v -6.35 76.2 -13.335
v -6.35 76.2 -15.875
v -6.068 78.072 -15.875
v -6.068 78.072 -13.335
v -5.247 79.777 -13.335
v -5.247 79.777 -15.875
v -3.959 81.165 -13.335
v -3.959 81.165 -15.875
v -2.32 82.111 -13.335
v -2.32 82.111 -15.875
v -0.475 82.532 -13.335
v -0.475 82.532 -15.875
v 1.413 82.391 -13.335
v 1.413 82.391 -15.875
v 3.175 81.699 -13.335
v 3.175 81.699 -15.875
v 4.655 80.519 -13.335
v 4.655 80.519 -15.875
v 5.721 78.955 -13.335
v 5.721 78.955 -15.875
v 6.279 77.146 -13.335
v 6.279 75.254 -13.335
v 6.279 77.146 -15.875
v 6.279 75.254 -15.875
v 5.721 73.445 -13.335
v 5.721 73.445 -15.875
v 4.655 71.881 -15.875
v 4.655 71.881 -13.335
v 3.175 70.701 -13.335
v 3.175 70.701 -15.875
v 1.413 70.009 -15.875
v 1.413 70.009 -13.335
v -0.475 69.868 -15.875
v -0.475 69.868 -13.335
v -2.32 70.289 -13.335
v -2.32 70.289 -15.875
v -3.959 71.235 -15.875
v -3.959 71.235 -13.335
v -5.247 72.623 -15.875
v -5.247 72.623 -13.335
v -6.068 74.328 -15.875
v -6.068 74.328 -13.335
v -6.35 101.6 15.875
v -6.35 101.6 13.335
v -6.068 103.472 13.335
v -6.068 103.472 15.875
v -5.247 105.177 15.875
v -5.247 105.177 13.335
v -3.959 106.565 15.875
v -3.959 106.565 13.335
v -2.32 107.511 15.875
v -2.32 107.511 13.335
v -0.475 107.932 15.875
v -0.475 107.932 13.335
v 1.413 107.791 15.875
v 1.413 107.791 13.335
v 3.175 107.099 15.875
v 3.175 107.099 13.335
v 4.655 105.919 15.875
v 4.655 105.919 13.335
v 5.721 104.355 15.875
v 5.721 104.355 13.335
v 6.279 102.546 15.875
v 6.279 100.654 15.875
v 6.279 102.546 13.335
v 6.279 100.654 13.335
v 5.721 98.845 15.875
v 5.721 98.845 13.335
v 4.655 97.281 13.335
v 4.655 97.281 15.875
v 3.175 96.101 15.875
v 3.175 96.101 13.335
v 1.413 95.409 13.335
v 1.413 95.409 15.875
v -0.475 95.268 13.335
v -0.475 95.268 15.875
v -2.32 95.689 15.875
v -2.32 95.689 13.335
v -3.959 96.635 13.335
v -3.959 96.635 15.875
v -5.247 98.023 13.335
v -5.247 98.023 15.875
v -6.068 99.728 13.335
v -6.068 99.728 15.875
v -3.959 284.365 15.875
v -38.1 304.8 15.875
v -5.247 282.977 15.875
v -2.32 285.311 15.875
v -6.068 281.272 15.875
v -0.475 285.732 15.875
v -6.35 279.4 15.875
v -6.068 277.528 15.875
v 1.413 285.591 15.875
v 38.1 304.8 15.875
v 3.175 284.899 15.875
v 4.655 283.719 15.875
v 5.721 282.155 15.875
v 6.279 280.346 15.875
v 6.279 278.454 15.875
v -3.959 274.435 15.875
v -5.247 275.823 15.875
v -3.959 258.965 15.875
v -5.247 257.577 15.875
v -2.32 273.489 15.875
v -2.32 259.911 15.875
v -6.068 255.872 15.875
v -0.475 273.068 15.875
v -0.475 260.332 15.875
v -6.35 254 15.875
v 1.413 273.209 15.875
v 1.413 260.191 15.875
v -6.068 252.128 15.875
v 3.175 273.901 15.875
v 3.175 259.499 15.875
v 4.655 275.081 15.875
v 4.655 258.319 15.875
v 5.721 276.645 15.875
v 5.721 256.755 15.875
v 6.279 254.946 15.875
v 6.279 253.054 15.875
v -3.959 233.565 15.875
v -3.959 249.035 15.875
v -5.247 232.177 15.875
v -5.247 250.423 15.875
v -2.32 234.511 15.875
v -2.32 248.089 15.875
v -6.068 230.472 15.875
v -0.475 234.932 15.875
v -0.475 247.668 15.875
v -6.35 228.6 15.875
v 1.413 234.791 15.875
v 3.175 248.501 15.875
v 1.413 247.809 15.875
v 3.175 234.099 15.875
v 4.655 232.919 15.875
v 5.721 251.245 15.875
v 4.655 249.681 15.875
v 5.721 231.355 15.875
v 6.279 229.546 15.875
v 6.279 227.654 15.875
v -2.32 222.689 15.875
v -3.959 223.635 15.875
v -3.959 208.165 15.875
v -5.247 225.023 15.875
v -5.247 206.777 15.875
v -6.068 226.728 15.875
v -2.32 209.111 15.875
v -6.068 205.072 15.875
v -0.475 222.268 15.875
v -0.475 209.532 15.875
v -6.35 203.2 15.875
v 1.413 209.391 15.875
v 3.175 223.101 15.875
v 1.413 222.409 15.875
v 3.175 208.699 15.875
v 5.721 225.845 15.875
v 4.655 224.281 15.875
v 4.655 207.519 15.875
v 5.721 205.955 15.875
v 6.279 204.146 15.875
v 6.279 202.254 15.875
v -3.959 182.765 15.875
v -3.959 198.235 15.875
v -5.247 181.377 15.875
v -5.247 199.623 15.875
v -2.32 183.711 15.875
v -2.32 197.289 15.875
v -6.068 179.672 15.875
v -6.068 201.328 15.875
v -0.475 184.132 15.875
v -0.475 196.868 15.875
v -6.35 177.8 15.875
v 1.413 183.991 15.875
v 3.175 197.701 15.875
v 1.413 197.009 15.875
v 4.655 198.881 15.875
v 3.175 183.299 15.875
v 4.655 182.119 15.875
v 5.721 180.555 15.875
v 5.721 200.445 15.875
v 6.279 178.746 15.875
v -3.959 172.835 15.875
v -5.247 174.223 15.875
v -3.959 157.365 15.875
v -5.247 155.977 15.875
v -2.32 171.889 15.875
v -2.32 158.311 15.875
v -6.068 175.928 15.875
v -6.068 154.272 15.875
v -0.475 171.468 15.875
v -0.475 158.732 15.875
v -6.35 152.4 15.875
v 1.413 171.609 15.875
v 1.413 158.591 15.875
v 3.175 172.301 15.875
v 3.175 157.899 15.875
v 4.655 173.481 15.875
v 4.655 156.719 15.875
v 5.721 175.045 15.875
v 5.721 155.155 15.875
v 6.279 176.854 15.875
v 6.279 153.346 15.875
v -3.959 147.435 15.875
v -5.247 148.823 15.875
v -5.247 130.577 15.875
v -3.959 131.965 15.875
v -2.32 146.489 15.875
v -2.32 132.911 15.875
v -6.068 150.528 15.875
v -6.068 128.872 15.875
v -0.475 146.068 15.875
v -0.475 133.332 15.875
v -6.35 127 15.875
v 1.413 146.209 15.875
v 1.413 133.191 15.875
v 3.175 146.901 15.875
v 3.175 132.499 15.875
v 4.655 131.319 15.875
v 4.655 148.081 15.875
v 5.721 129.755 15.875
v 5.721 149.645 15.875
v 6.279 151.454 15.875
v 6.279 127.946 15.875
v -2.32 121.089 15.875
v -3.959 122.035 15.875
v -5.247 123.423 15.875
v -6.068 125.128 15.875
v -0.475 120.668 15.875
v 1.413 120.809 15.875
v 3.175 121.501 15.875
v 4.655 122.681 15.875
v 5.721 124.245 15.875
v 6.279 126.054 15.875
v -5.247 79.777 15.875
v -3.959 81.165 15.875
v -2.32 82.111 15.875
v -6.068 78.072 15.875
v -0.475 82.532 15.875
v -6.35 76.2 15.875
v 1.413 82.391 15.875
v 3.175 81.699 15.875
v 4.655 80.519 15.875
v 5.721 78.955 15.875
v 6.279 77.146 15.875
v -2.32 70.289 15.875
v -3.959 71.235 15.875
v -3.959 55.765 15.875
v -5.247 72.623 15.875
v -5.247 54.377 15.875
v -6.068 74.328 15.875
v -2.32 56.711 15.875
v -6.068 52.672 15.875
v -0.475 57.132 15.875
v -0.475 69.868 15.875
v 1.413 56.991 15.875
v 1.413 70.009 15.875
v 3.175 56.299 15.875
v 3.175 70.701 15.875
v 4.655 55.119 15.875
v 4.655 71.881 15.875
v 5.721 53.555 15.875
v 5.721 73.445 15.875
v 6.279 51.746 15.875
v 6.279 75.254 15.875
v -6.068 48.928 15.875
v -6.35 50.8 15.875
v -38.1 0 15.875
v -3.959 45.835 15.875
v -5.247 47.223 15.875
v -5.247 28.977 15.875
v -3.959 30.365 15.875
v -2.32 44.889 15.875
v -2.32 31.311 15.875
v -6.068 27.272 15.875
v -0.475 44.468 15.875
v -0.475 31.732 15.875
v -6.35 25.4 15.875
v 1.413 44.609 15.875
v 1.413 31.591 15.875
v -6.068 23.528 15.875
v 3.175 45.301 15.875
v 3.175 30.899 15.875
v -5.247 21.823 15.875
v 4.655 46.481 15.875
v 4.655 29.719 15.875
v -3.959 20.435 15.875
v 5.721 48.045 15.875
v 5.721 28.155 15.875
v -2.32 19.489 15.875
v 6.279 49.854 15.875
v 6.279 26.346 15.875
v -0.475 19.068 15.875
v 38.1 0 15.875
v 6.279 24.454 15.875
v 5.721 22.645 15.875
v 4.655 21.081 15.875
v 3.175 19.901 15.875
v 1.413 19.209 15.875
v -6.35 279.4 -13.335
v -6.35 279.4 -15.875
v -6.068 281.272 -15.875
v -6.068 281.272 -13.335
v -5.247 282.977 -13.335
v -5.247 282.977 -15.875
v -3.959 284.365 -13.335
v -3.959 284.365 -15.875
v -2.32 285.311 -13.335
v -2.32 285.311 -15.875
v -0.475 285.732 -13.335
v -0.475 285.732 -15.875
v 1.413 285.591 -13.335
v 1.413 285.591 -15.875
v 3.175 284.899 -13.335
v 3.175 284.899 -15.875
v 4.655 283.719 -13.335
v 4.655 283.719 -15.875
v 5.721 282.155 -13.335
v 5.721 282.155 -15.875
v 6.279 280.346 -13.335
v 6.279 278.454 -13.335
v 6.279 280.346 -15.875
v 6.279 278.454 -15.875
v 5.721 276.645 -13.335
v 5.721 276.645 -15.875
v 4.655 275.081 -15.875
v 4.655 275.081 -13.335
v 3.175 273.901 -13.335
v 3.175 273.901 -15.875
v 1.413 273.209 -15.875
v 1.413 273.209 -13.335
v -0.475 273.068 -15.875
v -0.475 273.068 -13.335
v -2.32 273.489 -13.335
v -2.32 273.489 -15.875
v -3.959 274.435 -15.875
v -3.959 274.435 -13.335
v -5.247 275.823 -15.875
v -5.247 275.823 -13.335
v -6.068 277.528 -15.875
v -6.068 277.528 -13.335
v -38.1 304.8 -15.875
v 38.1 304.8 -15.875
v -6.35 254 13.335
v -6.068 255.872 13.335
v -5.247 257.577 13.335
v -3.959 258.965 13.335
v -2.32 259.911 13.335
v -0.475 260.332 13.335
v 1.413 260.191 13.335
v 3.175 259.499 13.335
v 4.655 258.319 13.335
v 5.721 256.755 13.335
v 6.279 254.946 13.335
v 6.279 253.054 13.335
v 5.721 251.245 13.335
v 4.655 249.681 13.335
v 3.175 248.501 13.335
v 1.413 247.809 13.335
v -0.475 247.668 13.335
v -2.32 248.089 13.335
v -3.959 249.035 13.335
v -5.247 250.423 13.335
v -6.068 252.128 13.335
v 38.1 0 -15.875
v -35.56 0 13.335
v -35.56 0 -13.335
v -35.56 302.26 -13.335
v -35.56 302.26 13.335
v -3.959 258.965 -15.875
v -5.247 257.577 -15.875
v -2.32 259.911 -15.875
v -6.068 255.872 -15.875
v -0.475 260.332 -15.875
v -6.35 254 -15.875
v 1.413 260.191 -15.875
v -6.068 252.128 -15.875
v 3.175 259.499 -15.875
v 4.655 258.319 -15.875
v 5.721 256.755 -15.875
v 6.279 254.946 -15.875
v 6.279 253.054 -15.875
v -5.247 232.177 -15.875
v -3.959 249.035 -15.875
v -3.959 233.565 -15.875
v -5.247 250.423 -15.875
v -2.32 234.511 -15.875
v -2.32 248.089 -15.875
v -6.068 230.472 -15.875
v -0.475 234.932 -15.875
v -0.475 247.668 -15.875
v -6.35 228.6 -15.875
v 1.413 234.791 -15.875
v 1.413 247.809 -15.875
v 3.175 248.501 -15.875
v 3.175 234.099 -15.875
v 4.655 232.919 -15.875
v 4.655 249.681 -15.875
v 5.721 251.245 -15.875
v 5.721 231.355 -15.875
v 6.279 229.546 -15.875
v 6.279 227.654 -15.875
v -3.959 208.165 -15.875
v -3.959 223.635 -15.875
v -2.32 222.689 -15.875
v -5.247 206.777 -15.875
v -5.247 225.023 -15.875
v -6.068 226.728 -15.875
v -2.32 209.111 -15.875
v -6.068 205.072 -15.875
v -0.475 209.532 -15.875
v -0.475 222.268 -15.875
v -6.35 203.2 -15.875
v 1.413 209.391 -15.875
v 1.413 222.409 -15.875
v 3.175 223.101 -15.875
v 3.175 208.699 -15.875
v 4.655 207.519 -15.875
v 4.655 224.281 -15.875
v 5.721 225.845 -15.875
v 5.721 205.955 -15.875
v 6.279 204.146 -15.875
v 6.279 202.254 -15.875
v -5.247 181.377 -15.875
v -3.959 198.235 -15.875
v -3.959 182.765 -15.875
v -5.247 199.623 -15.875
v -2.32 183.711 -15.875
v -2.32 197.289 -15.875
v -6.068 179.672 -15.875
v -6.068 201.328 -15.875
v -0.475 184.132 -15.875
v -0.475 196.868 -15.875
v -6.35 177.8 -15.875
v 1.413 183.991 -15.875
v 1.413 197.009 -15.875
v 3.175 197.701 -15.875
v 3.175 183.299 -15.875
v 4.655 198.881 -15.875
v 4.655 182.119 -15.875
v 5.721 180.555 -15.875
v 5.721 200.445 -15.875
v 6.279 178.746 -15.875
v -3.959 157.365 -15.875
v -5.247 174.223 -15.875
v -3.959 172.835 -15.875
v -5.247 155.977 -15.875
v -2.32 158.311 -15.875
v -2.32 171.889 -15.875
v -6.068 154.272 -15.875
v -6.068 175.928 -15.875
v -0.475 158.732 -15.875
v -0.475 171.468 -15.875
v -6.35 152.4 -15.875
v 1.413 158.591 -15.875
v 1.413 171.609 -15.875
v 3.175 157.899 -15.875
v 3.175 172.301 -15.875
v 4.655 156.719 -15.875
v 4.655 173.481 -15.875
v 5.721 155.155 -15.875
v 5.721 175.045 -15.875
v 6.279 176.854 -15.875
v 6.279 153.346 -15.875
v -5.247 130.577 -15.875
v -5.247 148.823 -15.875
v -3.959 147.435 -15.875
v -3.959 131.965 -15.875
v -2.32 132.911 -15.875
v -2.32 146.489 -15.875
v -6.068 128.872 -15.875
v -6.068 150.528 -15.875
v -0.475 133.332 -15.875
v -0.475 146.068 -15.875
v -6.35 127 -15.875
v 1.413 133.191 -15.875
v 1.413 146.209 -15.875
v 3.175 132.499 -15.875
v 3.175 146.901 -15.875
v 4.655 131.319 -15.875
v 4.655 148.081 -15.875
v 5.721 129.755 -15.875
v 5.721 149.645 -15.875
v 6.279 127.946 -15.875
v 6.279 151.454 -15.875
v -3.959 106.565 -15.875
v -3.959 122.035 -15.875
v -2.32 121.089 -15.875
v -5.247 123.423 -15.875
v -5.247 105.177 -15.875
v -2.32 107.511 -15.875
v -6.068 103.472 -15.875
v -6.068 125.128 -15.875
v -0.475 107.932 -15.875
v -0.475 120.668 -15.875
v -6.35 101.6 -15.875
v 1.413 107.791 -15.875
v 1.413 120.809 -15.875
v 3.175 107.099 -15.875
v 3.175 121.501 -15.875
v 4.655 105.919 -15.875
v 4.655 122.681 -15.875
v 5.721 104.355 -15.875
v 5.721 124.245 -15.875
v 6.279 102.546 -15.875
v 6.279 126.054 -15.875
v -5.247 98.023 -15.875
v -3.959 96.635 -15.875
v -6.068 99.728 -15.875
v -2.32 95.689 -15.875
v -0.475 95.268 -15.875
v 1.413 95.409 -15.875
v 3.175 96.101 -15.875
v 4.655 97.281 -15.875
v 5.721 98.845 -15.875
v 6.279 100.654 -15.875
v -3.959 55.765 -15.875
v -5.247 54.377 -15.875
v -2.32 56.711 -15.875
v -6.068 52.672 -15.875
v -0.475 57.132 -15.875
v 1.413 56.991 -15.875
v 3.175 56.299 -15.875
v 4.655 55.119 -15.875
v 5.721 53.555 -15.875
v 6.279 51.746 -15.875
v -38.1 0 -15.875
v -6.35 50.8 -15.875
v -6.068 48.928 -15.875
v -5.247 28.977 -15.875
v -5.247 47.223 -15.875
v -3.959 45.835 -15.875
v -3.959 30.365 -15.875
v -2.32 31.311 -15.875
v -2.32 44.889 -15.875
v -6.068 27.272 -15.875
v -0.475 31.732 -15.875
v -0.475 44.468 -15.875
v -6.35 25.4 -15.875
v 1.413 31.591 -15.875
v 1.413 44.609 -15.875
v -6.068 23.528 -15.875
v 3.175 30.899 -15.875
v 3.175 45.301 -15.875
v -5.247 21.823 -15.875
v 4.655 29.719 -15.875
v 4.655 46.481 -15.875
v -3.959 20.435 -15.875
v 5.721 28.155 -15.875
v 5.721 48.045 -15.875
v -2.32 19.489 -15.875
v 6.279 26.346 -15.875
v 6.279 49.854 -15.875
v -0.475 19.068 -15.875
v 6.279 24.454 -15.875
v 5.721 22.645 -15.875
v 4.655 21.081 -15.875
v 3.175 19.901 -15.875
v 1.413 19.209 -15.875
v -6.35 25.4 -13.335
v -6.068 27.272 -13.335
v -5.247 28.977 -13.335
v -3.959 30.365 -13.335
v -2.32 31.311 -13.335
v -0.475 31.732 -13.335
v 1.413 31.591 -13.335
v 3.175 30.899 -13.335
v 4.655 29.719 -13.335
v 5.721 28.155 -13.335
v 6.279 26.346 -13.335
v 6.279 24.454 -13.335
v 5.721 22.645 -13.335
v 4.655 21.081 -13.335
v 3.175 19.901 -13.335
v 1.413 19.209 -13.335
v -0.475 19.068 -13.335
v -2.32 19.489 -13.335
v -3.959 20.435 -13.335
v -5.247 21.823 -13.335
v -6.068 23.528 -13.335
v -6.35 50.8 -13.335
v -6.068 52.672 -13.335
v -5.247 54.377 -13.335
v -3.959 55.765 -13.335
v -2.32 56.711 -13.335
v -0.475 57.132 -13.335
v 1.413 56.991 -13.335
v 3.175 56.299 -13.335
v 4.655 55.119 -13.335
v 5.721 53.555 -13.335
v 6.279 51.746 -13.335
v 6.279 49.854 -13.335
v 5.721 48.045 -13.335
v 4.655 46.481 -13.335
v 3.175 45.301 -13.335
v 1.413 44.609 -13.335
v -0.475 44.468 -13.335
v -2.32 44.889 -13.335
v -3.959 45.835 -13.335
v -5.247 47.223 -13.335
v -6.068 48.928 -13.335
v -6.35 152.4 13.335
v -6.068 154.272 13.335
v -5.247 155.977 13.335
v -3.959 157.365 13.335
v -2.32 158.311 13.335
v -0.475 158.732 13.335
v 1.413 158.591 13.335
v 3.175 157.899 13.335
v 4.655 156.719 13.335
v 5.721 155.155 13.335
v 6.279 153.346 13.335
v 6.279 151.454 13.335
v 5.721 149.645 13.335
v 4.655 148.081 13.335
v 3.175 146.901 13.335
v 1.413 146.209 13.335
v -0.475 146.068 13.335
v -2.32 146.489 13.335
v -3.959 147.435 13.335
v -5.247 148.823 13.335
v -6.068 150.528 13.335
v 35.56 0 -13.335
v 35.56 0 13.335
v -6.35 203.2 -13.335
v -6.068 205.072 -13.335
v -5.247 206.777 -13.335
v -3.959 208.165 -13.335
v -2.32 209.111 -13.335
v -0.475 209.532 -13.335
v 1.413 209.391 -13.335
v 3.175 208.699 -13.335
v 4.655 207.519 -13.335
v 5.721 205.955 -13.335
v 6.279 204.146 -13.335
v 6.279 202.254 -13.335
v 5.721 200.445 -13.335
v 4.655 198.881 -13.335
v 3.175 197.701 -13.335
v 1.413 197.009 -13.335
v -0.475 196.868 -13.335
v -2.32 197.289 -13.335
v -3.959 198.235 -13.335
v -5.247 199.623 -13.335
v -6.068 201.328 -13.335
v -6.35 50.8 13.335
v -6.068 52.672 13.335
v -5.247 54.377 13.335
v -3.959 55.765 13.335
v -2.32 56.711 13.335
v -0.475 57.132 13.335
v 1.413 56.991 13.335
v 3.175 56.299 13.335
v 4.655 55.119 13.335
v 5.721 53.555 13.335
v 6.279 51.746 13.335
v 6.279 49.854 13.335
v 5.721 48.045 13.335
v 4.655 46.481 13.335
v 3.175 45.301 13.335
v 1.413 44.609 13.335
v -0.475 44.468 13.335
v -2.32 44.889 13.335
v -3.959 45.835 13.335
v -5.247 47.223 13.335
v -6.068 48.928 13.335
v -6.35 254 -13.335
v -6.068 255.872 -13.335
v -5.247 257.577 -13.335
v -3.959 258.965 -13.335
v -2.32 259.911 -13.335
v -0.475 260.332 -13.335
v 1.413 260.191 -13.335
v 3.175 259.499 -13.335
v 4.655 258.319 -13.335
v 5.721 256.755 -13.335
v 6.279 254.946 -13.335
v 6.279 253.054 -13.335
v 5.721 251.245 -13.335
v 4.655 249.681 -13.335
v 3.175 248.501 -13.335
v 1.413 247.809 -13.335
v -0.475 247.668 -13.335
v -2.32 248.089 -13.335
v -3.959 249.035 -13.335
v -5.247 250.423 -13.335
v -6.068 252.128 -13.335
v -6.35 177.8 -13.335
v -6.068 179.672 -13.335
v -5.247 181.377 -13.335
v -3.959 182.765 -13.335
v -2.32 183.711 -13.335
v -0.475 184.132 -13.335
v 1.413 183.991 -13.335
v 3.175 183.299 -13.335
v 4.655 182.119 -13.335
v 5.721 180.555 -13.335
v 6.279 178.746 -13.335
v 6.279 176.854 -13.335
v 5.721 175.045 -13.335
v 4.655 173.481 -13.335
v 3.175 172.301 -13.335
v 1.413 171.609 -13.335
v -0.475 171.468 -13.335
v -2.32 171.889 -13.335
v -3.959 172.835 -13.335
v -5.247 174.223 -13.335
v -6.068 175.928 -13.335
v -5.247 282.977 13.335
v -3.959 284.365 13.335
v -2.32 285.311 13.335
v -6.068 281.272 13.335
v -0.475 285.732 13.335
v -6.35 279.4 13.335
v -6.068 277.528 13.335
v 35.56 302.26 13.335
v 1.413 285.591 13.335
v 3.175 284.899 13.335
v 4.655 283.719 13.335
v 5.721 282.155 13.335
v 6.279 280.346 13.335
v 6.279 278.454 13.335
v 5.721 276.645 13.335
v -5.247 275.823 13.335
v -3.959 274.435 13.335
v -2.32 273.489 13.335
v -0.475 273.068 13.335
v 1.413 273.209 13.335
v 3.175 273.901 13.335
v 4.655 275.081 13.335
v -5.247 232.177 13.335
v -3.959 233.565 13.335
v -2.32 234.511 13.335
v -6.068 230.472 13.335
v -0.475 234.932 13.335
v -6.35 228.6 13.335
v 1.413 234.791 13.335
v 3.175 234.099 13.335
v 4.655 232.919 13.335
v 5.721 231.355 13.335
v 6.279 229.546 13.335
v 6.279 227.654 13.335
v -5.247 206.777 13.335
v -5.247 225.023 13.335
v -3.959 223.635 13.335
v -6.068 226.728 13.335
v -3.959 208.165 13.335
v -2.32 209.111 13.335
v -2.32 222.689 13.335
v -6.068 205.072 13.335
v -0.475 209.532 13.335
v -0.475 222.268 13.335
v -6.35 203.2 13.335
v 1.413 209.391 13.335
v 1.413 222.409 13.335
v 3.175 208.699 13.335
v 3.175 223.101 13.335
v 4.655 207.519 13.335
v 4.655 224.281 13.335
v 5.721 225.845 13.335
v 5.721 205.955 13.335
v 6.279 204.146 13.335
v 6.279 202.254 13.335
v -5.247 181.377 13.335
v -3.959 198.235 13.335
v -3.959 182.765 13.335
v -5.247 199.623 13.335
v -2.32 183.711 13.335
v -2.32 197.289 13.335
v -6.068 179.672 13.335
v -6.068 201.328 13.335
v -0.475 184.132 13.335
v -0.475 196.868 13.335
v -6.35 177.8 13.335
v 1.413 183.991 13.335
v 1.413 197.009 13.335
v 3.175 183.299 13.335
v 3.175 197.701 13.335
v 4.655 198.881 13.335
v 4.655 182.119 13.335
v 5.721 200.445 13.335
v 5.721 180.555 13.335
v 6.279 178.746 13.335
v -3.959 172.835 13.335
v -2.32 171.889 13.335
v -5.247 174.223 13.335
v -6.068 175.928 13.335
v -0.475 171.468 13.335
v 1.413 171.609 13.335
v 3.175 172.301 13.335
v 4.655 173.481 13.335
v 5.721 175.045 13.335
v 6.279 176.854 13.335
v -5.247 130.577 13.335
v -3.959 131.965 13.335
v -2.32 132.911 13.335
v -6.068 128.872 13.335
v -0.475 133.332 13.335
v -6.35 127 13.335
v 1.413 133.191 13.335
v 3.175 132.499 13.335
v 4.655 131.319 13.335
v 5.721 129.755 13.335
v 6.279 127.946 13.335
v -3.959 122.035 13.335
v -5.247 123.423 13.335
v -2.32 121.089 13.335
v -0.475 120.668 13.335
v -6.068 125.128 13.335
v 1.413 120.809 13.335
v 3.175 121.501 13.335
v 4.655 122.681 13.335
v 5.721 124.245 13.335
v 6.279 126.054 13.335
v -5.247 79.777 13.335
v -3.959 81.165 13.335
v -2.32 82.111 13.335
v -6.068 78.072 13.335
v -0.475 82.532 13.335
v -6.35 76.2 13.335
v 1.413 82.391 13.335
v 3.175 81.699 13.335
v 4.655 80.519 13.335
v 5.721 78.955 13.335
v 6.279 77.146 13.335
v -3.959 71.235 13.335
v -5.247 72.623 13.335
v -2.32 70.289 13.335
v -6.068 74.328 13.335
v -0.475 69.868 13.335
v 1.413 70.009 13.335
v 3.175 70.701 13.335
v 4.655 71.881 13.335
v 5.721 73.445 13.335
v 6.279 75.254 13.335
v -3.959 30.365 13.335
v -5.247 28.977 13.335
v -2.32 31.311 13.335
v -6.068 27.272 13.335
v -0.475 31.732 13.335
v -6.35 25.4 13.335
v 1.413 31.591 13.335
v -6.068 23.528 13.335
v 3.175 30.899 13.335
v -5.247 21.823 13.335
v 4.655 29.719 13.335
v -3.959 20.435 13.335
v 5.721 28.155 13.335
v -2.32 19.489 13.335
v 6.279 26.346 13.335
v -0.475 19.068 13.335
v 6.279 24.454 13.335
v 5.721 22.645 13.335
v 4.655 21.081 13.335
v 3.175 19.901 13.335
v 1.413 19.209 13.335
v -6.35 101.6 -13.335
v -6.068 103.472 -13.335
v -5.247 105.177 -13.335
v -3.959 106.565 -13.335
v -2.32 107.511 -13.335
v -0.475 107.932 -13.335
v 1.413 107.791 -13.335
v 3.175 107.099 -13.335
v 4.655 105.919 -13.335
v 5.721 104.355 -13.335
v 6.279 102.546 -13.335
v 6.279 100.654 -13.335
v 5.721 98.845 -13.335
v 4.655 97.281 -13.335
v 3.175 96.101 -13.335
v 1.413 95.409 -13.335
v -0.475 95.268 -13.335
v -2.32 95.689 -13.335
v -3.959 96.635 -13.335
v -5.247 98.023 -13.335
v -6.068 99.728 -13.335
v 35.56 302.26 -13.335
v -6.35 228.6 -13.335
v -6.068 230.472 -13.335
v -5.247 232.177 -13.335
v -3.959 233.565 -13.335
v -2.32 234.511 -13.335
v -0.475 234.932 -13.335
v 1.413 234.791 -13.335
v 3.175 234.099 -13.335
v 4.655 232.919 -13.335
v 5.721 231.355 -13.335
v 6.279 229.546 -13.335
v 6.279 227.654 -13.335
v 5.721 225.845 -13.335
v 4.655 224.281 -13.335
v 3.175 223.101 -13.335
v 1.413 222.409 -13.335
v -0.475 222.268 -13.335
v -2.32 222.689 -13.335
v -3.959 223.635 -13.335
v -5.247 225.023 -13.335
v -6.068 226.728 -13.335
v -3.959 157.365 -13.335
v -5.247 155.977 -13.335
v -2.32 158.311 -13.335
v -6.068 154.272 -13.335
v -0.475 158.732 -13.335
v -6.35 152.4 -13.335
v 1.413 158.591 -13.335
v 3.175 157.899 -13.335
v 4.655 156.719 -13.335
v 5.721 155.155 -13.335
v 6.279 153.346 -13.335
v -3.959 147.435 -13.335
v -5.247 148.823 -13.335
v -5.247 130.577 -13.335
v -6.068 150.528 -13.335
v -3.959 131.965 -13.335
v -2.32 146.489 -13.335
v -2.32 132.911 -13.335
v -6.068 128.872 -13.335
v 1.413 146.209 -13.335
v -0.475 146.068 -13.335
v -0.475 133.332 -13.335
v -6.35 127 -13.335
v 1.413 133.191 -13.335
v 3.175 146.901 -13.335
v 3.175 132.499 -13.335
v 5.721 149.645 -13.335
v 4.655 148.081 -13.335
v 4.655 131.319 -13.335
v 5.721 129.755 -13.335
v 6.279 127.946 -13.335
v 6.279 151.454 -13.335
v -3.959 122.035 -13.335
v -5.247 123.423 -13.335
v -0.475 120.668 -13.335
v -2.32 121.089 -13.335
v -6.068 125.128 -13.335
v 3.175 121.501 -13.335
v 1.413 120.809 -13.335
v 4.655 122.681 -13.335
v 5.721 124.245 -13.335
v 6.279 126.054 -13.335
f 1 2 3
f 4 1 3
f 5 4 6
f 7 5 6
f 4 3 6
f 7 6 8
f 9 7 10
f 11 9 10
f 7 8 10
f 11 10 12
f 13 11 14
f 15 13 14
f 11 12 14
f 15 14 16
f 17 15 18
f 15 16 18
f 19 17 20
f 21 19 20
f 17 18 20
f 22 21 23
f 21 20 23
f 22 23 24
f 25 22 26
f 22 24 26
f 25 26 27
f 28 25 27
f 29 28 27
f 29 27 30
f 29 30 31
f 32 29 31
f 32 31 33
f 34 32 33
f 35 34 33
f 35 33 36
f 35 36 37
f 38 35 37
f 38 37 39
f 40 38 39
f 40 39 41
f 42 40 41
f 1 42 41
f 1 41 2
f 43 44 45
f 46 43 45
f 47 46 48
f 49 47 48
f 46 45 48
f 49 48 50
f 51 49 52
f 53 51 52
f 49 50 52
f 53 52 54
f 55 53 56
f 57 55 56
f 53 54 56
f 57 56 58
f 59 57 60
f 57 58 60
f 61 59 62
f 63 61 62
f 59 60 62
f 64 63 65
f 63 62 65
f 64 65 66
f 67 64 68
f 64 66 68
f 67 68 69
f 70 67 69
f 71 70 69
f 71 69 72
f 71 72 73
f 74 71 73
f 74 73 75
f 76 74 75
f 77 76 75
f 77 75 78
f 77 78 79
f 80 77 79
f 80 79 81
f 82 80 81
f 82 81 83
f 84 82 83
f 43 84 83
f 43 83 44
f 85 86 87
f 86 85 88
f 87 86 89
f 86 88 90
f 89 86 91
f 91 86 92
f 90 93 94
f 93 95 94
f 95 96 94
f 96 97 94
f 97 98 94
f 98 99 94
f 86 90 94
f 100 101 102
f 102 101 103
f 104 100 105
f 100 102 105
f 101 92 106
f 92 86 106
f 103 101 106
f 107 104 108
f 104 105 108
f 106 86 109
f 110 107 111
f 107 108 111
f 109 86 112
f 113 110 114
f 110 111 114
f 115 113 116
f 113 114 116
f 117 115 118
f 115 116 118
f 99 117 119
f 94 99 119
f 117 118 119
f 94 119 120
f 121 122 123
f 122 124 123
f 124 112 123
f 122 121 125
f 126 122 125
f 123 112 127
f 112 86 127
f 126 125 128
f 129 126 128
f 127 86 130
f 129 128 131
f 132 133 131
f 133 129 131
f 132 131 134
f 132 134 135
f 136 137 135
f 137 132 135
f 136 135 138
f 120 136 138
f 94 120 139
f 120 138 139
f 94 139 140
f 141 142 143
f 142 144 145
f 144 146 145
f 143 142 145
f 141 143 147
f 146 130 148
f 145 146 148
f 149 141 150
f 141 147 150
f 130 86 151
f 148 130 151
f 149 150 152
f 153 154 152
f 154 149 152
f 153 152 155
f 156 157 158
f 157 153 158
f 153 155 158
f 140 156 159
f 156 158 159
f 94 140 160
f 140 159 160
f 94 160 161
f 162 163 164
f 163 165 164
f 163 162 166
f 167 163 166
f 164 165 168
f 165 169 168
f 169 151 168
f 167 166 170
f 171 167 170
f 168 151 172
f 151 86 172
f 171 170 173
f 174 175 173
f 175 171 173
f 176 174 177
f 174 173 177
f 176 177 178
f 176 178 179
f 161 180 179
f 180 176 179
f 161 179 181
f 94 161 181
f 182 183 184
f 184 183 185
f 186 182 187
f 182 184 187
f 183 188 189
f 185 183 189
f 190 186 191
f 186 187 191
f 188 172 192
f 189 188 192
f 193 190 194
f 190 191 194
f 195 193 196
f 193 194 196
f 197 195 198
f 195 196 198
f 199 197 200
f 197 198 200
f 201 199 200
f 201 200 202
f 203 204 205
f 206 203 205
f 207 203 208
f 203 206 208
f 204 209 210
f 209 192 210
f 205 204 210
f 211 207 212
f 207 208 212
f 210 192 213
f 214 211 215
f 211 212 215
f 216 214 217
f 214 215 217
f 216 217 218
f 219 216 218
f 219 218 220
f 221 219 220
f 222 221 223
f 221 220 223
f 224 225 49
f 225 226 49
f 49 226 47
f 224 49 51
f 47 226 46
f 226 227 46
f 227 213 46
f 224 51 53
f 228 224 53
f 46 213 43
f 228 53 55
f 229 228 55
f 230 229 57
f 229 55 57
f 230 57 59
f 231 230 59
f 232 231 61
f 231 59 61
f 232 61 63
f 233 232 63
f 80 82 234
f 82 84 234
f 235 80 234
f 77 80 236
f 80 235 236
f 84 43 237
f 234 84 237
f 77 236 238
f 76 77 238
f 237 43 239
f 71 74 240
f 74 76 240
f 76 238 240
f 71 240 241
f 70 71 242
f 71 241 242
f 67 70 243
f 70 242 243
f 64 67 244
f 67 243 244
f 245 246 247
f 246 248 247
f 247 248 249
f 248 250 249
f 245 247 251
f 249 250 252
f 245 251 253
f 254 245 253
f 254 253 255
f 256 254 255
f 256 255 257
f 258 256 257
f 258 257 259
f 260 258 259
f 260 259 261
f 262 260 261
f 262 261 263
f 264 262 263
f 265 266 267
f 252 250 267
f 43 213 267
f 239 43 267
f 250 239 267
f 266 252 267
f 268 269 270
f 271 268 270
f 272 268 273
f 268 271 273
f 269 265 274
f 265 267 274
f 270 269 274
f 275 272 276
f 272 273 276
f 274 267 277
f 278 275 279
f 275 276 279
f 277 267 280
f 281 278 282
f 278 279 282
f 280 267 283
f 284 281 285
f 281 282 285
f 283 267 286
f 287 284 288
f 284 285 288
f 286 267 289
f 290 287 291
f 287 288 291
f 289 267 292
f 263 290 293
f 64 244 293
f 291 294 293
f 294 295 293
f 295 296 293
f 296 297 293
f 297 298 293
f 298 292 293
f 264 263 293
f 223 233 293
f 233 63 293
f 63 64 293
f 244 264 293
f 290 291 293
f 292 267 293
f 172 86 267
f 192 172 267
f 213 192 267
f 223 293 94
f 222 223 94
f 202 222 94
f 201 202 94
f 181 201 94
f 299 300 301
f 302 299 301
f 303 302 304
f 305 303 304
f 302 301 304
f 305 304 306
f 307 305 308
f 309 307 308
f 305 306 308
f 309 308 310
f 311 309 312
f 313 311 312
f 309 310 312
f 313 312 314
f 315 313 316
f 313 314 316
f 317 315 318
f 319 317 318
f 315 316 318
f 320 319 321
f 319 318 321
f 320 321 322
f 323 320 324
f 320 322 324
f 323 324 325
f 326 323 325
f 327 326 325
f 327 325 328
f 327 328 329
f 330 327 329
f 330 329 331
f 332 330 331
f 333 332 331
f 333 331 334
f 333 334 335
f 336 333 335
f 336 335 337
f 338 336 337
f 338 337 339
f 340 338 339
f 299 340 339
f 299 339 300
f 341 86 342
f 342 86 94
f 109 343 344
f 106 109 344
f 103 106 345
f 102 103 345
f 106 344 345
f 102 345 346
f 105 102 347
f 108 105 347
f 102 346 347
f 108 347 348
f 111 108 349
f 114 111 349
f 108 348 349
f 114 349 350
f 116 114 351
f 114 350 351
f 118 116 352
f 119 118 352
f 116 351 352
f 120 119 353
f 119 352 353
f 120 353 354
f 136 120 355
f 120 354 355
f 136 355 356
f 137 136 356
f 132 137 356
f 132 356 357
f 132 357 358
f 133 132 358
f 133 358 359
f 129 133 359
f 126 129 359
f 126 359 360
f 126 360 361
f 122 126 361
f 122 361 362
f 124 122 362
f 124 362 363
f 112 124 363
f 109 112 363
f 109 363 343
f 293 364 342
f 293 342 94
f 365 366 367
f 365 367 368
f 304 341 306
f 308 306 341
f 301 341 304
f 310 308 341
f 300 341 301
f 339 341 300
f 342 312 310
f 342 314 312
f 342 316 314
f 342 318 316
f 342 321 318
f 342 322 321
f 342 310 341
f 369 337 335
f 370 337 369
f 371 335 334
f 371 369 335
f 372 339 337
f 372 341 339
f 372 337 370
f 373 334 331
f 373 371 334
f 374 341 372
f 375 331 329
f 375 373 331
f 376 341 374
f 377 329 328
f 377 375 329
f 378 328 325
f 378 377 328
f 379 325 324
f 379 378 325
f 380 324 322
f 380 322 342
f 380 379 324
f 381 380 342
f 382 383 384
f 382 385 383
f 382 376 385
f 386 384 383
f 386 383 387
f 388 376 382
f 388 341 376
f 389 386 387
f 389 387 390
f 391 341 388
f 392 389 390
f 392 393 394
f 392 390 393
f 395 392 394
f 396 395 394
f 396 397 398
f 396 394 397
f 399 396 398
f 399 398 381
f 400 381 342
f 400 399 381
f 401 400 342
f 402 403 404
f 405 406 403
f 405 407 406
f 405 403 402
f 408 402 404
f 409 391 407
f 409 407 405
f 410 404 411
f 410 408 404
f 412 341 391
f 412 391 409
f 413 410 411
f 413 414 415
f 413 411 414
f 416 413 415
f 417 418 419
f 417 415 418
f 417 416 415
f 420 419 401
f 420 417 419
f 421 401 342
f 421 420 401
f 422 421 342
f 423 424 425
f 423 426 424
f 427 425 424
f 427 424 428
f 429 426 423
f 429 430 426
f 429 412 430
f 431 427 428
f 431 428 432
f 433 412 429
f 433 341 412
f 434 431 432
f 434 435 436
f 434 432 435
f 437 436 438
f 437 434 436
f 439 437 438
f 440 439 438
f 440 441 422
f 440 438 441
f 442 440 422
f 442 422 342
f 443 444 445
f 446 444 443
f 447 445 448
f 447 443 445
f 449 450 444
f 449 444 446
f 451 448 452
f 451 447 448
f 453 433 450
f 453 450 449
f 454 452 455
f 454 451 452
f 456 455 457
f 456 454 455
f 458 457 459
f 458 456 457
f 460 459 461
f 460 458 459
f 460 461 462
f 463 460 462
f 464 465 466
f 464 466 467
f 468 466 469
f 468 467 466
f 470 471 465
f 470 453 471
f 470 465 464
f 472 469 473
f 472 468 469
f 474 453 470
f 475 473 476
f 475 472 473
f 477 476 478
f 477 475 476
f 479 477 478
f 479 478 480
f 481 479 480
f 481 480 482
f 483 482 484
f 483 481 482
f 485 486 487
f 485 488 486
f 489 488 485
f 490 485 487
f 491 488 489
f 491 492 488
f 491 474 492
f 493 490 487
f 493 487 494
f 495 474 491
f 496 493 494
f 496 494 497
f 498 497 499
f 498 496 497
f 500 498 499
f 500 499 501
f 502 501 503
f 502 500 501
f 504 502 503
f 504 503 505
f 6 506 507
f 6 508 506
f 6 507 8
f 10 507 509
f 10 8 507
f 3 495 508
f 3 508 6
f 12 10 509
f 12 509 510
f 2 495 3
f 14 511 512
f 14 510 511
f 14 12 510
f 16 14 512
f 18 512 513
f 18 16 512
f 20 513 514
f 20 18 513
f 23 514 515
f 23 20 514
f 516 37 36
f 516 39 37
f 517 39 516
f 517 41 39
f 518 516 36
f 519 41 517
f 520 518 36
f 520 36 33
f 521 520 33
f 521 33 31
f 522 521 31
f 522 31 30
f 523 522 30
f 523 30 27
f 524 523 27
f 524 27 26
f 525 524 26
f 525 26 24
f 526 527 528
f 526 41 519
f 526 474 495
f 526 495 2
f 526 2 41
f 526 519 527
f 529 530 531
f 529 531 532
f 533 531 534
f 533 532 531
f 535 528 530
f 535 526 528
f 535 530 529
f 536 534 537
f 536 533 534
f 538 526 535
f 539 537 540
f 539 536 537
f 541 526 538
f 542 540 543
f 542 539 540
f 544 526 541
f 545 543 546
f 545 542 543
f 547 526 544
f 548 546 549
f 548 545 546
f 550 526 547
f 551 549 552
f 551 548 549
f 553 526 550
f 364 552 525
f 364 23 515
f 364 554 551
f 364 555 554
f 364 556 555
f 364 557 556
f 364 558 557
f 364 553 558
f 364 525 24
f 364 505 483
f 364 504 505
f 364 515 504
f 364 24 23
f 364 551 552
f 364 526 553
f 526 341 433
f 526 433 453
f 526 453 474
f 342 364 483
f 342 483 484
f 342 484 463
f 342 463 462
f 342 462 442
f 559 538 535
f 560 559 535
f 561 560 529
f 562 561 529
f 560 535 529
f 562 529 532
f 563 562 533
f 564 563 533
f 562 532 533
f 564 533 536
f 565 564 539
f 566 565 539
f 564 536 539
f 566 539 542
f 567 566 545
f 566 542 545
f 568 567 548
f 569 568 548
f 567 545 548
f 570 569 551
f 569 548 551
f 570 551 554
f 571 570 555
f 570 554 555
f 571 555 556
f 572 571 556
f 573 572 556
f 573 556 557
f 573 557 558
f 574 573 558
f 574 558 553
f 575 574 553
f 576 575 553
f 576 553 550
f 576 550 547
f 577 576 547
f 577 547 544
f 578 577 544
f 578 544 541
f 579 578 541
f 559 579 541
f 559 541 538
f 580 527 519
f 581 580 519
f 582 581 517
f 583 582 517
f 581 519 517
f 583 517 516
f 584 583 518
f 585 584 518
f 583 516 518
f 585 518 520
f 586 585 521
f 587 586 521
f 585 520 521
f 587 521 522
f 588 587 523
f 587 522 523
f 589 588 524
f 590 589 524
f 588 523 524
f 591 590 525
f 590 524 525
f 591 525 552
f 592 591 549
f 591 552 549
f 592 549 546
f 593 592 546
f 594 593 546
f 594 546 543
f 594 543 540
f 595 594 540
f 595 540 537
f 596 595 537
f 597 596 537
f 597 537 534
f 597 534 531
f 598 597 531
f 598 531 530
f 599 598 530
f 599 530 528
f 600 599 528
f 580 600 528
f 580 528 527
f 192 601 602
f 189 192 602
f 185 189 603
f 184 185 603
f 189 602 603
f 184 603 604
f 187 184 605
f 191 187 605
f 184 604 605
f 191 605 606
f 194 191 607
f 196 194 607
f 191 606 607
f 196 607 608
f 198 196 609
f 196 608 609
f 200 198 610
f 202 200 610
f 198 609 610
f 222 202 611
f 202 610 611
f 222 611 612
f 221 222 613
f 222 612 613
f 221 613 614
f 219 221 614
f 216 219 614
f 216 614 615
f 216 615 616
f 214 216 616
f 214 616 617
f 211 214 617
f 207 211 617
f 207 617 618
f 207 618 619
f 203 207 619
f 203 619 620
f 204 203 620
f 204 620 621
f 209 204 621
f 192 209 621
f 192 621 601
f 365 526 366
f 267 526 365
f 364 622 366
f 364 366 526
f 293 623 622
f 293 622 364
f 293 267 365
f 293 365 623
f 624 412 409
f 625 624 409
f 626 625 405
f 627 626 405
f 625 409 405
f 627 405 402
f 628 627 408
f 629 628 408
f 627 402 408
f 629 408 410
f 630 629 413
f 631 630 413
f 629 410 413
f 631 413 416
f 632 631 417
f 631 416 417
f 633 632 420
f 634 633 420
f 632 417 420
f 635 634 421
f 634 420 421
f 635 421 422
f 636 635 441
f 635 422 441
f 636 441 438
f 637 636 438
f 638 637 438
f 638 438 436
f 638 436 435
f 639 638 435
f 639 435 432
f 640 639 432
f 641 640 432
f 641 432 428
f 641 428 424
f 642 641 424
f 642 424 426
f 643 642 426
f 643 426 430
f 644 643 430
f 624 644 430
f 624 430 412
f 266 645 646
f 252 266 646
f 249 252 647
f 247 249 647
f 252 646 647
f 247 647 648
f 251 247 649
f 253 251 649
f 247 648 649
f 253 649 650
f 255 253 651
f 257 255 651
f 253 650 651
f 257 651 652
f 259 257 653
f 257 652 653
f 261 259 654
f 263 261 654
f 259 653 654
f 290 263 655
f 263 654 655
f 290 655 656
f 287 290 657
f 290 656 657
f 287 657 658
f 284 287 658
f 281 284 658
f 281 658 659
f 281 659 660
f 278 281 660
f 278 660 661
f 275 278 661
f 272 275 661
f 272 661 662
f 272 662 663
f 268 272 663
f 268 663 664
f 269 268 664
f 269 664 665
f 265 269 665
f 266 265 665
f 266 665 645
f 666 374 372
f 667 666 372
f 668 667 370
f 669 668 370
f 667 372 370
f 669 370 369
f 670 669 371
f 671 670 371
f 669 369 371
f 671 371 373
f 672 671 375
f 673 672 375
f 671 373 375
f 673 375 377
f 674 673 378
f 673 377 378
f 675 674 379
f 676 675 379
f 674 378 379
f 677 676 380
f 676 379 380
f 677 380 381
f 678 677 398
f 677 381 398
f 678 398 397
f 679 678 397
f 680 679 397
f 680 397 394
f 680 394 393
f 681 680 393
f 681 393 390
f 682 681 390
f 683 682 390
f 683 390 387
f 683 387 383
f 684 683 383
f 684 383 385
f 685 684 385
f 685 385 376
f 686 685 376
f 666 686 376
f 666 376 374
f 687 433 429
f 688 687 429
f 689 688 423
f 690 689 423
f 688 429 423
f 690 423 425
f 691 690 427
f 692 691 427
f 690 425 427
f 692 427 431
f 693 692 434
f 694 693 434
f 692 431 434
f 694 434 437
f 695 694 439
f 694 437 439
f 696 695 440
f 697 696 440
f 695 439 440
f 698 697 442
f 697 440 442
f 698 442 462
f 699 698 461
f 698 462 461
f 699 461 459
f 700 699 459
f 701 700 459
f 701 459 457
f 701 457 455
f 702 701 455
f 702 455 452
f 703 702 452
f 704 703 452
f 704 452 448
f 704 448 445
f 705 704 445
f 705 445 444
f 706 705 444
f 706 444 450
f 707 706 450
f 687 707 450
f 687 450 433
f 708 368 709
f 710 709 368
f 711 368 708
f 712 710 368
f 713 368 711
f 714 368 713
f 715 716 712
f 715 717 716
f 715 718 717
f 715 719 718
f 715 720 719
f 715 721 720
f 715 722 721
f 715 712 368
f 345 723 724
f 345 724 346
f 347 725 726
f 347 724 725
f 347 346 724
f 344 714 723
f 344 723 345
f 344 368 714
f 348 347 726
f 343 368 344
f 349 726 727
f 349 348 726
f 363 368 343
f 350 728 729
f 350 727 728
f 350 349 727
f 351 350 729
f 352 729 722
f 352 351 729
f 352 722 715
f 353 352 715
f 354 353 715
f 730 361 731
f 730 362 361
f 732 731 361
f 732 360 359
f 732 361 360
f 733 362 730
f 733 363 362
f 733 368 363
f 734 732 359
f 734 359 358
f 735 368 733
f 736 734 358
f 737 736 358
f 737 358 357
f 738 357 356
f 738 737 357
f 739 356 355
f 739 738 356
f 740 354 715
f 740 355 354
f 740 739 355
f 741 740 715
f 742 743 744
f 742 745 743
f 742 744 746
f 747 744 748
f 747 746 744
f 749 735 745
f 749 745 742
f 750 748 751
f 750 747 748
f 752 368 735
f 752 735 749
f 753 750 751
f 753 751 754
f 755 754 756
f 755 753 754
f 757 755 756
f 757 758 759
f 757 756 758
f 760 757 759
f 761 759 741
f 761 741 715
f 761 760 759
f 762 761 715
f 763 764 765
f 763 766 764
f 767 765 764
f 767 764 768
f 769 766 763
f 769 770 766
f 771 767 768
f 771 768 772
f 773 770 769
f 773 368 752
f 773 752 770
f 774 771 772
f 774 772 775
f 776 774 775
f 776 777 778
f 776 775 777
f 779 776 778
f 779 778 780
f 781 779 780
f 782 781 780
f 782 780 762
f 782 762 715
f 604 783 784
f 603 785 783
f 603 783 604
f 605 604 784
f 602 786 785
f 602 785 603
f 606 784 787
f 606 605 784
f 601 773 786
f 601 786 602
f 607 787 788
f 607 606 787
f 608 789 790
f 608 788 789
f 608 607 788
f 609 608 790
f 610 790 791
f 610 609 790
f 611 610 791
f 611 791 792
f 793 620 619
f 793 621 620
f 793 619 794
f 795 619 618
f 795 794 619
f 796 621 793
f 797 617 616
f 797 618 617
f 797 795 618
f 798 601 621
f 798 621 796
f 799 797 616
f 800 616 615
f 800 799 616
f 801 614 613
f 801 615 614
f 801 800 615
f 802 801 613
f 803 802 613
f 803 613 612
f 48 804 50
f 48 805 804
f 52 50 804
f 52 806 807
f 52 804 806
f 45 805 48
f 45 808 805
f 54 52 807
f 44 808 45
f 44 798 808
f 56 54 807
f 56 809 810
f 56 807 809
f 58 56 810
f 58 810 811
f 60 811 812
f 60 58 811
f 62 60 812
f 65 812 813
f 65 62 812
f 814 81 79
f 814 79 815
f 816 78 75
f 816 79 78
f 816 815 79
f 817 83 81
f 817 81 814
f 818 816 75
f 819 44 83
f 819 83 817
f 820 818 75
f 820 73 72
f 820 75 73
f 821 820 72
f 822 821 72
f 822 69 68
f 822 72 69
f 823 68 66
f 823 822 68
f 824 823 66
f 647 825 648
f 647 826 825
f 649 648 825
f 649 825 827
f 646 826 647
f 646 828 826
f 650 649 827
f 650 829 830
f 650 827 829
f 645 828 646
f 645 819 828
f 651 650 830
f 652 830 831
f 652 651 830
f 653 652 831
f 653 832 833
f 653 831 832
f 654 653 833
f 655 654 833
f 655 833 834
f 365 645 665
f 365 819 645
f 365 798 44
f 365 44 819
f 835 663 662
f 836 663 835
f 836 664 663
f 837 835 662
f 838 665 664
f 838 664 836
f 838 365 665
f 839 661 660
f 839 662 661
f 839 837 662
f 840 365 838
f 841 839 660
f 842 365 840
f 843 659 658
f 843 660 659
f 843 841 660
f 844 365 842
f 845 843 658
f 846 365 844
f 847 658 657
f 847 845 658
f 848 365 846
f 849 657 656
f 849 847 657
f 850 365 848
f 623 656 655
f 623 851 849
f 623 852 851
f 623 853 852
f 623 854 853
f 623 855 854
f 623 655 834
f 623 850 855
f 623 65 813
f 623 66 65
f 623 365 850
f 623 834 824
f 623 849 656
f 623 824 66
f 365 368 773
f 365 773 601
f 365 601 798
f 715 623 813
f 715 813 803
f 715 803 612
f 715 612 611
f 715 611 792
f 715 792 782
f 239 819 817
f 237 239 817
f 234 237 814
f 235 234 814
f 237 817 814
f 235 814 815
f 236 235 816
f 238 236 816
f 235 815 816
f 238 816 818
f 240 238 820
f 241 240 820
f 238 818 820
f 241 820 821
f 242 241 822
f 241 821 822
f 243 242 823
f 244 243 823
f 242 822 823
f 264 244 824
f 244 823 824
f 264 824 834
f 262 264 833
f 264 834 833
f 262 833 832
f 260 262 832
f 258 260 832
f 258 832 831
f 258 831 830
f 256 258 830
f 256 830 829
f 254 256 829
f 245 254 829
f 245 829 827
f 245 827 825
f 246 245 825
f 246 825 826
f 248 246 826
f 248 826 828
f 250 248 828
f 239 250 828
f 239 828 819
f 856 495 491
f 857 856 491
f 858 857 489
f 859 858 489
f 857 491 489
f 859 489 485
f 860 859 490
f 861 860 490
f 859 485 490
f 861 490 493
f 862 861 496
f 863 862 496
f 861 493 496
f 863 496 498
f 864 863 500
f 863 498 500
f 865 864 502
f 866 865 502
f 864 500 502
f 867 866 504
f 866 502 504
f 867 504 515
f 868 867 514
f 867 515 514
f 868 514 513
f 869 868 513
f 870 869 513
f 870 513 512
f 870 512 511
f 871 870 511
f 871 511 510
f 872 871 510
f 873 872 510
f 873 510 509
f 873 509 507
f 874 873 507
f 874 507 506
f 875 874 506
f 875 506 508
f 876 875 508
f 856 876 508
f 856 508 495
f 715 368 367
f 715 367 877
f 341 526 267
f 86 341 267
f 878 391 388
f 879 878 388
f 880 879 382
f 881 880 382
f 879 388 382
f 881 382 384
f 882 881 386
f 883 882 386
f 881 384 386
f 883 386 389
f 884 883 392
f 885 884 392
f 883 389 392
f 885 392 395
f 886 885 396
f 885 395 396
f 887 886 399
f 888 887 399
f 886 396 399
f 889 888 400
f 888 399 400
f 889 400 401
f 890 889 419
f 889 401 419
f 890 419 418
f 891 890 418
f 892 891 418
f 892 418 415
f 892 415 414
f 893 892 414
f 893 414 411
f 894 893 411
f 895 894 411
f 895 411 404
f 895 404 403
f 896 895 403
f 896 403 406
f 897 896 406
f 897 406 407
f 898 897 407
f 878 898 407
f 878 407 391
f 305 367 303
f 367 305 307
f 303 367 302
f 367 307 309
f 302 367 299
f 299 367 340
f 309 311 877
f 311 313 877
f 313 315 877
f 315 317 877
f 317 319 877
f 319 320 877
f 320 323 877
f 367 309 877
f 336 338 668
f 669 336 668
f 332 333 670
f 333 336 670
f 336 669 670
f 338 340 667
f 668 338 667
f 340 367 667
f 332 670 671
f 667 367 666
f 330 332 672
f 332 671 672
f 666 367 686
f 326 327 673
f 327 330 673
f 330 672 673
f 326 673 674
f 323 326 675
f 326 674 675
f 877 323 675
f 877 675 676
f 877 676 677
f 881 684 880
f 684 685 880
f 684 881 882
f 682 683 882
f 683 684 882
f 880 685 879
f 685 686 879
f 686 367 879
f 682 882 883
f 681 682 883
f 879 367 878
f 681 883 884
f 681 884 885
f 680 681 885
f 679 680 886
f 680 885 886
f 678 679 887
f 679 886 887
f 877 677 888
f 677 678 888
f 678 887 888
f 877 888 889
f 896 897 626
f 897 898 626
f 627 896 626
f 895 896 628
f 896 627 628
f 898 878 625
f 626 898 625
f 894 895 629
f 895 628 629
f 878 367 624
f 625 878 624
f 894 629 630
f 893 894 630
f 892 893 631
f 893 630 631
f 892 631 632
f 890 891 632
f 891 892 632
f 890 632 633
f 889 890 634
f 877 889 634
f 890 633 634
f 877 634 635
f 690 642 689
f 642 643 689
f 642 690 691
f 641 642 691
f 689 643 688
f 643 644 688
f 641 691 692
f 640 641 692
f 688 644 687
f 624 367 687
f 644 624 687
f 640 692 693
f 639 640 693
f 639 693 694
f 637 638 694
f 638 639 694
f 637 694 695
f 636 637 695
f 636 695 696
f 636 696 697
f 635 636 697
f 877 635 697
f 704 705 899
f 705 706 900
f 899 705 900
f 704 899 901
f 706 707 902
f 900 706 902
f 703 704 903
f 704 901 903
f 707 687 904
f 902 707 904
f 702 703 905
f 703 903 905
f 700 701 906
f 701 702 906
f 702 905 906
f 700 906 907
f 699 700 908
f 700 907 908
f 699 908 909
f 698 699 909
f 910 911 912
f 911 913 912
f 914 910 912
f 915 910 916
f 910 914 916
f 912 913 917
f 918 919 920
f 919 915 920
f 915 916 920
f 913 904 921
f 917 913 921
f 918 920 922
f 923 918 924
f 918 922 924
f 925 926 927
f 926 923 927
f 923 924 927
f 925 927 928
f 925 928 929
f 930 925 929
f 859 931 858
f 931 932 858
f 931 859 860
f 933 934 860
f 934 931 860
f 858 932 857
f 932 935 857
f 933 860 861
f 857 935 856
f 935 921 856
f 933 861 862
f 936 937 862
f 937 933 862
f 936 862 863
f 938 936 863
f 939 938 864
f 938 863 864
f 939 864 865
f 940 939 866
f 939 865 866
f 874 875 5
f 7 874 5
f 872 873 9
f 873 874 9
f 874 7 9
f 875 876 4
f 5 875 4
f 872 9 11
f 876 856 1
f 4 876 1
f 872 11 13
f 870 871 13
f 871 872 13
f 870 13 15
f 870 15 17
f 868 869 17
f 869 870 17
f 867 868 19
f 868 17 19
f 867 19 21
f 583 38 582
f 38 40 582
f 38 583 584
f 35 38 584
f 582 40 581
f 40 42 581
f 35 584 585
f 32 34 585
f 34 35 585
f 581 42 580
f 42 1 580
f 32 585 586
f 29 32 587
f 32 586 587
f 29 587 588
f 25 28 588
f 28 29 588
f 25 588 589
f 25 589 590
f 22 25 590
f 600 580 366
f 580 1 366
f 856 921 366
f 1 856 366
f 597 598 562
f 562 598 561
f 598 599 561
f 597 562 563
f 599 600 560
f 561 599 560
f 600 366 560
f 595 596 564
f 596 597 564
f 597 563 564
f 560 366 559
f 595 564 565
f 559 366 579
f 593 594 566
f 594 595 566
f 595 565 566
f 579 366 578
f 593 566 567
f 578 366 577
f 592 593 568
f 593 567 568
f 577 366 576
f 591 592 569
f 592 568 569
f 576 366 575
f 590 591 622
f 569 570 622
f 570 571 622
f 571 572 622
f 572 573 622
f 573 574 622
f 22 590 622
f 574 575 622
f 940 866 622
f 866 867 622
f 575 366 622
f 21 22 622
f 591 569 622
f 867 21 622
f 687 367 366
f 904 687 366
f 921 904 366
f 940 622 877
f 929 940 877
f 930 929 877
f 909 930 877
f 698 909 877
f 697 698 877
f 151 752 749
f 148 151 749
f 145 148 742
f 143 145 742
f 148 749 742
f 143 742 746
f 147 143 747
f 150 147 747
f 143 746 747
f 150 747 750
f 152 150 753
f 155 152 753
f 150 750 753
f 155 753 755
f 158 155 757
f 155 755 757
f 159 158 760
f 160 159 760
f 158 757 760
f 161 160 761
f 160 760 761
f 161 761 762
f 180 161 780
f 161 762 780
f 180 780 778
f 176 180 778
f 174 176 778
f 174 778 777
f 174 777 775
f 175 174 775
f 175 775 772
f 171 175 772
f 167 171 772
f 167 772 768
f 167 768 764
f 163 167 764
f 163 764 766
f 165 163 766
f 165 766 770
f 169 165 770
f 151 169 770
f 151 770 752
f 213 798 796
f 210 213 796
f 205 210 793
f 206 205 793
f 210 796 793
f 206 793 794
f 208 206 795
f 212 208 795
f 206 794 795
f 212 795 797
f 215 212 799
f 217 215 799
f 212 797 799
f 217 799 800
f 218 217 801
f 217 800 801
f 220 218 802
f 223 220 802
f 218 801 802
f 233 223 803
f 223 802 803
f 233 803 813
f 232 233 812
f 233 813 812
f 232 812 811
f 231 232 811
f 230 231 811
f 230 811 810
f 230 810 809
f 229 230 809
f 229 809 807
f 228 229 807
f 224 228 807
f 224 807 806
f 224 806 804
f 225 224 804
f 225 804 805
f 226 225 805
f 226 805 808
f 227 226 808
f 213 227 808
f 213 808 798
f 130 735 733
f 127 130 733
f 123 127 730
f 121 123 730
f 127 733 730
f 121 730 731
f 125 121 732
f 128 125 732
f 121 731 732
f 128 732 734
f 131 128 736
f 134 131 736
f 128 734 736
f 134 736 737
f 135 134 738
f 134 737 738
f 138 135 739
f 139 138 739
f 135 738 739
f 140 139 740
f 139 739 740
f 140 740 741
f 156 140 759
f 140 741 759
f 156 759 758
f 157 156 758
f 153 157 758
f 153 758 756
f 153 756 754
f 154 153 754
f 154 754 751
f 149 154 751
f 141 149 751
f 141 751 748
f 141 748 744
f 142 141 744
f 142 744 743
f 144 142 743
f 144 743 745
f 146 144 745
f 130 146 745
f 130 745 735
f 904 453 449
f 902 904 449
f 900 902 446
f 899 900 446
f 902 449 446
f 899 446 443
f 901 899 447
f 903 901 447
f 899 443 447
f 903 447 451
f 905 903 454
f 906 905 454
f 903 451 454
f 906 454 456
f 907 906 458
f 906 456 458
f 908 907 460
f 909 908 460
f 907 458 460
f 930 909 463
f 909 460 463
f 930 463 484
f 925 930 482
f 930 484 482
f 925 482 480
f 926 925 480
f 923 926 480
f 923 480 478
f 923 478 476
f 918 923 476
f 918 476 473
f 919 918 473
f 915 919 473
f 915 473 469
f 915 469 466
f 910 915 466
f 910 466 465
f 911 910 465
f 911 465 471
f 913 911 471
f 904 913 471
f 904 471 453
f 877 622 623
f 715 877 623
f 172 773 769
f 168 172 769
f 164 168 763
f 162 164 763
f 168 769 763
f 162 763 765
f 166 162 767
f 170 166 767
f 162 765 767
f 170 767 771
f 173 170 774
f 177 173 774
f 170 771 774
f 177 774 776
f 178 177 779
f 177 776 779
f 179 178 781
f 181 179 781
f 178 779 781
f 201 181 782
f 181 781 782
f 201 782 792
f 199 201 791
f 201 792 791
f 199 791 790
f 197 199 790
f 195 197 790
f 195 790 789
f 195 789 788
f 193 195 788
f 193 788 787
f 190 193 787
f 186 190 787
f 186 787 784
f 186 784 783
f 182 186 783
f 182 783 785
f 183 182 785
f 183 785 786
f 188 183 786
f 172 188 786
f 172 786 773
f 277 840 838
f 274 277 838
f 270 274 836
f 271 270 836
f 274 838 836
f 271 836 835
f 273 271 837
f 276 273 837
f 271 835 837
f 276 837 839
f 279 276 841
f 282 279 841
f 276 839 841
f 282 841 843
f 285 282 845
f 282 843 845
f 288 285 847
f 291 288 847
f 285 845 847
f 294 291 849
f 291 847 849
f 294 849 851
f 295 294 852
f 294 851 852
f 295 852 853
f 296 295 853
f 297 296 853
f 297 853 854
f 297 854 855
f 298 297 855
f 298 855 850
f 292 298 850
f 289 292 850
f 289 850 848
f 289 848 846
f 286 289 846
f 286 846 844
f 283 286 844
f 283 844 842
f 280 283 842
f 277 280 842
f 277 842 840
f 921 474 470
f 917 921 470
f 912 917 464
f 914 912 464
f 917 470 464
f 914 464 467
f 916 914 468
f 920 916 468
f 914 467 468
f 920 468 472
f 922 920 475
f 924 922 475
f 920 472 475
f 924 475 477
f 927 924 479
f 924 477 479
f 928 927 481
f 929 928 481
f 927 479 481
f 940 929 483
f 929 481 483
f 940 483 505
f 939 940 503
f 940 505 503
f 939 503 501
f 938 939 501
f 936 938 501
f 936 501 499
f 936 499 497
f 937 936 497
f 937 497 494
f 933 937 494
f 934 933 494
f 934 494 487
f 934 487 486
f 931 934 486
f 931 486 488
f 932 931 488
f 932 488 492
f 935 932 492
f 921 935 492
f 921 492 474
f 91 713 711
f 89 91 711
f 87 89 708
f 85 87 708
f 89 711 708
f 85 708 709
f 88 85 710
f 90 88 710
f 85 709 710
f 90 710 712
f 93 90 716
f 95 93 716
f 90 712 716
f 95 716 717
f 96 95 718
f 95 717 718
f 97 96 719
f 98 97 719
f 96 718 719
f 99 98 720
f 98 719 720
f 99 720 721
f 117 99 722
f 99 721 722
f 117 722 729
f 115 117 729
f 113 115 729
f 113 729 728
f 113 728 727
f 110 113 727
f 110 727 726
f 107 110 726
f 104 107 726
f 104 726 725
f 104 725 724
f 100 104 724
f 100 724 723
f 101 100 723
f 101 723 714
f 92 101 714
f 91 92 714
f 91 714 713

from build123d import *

# Parameters (mm, degrees)
F0_W     = 76.2
F0_H     = 31.75
F1_DEPTH = 304.8
F2_T     = -2.54
F4_D     = 12.7


with BuildPart() as f1:
    # F0 (on Front) → F1 (new body)
    with BuildSketch(Plane.XZ):
        Rectangle(F0_W, F0_H)
    extrude(amount=-F1_DEPTH)

    # F2
    f2_openings = [f1.faces().sort_by_distance(p)[0] for p in [
        (0, 0, 0),
    ]]
    offset(amount=F2_T, openings=f2_openings)

    # F4 (through all)
    with Locations(Plane.XY.offset(15.875)):
        with Locations((0, 279.4), (0, 254), (0, 228.6), (0, 203.2), (0, 177.8), (0, 152.4), (0, 127), (0, 101.6), (0, 76.2), (0, 25.4), (0, 50.8)):
            Hole(F4_D / 2)


solid = f1.part
